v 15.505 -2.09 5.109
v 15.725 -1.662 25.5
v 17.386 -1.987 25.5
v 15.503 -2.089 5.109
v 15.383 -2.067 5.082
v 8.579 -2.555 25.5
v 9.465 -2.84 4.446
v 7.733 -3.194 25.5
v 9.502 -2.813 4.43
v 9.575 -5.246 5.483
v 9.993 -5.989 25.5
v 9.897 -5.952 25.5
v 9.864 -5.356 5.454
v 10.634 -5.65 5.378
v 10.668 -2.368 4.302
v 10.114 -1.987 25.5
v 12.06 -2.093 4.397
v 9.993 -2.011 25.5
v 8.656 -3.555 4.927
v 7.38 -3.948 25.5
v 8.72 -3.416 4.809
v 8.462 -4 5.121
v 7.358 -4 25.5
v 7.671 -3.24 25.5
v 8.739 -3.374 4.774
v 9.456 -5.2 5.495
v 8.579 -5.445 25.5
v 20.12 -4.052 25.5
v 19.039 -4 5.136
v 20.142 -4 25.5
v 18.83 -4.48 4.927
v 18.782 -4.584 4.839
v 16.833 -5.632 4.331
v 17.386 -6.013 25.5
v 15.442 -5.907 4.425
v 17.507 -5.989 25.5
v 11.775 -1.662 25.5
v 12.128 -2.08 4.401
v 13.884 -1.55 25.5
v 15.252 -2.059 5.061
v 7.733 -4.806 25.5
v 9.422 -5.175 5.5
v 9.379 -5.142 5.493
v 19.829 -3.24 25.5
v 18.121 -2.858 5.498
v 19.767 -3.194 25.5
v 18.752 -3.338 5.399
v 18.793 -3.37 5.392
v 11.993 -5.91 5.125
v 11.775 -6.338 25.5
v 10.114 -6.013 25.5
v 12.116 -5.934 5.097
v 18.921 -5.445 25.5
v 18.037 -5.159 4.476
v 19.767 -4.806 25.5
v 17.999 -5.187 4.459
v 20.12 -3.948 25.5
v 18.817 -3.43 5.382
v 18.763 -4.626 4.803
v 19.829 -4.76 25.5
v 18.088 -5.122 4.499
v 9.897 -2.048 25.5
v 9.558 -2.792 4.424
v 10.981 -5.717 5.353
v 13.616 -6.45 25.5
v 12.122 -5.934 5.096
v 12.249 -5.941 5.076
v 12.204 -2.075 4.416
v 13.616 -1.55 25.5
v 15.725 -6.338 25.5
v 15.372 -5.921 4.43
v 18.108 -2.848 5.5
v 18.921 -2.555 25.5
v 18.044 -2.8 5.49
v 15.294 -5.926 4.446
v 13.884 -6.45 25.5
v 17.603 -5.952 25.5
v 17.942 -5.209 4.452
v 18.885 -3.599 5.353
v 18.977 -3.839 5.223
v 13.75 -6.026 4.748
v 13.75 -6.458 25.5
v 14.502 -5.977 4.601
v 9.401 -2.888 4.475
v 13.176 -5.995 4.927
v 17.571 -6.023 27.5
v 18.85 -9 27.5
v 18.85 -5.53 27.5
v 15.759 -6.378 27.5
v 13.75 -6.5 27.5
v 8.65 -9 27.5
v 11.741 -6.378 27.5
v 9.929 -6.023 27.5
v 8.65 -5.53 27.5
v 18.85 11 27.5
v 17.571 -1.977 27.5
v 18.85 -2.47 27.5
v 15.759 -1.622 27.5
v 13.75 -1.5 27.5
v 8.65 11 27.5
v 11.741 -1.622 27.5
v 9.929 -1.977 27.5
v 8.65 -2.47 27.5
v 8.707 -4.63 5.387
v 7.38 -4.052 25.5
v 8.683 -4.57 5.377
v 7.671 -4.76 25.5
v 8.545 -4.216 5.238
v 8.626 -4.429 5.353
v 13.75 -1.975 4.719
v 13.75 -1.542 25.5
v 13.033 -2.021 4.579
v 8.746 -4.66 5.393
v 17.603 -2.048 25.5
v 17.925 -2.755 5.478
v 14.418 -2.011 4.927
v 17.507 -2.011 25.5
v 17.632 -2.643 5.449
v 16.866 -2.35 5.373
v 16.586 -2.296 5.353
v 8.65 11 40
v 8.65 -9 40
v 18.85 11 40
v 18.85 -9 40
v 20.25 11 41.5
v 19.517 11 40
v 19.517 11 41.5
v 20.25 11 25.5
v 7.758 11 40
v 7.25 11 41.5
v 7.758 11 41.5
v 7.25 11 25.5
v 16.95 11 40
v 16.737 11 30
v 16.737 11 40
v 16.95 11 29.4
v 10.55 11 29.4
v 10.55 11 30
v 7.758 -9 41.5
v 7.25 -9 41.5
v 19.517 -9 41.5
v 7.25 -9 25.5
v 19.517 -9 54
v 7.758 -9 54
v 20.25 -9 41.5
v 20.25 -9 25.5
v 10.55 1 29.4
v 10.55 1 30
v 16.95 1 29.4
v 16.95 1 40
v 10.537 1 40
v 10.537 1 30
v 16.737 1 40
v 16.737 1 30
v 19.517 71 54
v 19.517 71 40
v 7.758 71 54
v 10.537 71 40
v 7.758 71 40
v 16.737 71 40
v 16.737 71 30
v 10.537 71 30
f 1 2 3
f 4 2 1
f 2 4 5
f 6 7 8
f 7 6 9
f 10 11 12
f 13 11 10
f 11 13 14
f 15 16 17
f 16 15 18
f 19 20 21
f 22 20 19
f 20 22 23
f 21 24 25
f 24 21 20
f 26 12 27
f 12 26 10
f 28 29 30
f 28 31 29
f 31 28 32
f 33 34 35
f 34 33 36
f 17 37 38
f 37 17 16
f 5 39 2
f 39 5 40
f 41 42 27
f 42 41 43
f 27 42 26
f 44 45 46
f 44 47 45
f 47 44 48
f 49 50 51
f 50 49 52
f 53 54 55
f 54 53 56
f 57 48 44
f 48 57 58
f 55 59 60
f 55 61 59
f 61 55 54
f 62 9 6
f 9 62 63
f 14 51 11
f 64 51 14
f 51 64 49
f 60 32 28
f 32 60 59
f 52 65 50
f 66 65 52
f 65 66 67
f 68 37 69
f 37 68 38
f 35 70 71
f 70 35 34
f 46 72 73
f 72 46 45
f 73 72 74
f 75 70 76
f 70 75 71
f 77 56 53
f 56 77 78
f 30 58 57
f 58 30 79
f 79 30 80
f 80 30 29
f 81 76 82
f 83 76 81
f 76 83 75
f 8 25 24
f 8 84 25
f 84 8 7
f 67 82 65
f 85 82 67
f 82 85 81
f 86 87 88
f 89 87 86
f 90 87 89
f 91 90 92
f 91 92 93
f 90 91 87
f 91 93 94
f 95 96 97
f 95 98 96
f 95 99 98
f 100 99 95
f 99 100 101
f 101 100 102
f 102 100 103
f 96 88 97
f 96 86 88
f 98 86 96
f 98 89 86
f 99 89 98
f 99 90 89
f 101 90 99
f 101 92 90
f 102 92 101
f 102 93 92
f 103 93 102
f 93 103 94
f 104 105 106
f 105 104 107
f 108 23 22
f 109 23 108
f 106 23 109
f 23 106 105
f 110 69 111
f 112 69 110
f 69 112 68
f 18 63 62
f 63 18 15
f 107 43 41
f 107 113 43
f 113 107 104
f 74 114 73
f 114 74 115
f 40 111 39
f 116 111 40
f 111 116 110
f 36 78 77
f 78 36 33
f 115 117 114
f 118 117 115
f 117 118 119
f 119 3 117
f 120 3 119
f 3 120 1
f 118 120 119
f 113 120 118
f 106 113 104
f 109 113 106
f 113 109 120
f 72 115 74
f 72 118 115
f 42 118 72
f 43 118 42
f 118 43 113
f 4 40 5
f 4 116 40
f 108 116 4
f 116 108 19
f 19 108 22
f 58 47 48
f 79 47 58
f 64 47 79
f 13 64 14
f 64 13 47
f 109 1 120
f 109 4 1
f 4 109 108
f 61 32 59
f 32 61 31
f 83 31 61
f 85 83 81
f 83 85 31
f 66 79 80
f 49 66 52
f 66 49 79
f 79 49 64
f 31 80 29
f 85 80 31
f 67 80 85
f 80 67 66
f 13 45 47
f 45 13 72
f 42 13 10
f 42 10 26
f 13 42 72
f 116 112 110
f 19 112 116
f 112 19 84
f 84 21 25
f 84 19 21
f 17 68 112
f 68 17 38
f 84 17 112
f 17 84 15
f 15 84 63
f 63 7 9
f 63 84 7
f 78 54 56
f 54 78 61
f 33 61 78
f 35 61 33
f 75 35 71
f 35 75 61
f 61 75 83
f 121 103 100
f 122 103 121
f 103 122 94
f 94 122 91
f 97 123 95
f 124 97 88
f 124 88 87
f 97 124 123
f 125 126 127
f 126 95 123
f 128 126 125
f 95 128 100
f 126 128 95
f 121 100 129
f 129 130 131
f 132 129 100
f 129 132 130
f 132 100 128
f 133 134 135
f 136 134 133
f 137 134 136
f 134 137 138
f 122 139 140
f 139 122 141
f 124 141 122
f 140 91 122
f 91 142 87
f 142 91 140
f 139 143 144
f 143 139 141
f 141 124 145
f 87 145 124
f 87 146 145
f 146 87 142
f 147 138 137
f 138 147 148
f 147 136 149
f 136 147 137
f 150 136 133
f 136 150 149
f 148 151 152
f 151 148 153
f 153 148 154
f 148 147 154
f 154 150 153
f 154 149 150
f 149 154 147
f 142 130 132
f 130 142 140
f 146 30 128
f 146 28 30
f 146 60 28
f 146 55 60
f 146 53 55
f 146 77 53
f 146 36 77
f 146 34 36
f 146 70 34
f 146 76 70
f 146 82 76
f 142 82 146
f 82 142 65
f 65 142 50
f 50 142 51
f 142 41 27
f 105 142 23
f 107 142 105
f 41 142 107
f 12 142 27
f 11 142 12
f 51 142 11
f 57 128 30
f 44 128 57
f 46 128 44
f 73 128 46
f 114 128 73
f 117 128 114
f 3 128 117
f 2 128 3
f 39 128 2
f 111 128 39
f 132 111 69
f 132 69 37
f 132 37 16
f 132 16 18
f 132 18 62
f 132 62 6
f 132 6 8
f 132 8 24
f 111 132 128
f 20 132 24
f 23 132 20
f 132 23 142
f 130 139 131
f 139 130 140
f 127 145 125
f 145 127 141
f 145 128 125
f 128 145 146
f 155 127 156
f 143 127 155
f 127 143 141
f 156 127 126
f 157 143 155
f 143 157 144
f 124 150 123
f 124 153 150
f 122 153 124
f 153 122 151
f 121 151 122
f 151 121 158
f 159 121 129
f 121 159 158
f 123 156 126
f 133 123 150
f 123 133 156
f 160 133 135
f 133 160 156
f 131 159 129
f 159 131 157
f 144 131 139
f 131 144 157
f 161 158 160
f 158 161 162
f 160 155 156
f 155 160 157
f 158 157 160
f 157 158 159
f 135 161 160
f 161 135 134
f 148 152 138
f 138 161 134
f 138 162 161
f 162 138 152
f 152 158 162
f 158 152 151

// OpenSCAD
// file: irkem_hammerTips_v1.scad
tol = 0.2;
extrWall = 1.7+tol;
extrH = 12.9+tol;//12.6+tol;
extrW = 10+tol;

hammerY = 20;
hammerZ = 24;

$fn = 20;

module hammerTips(){
//Strike cylinder:
//v1: made elliptical and added skew-angle indentation to:
//      1. Avoid hitting adjacent strings
//      2. Maximize likelihood of striking proper string
//      3. Ensure that hammer tip force on the string is centering
//Prior cone geometry resulted in adjacent string strikes in y axis for most keys
    difference(){
        translate([0,-5,0]) scale([2.6,1,1]) cylinder(hammerZ,2.5,2);
        translate([-12,-1.8,25]) rotate([0,90,-15]) cylinder(hammerZ,3,3);
    }
difference(){
    translate([-6.5,-10,-14]) cube([13,hammerY,16]);
    union(){uChan();translate([-extrW/2,-hammerY/2,-extrH]) cube([extrW,hammerY/2,extrH]);
}
}
module uChan(){
difference(){
    translate([-extrW/2,-hammerY/2,-extrH]) cube([extrW,hammerY,extrH]);
    translate([-extrW/2+extrWall,-hammerY/2,-extrH-extrWall]) cube([extrW-2*extrWall,hammerY,extrH]);
}
}
}

//hammerTips();
// main file
include <irkem_hammerTips_v1.scad>

xO = -6;
yO = -11;
zO = 40;

kH = 4;
bH = 10;
wL = 50;
bL = 80;
oct = 6.5 * 25.4;
gap = 2;
n_oct = 1;//5;
n_keys = 12 * n_oct;
oset = -1;

sharpFlag = 1;
//k=0;
//for (k = [0:1:(n_keys-1)]){
    //
    translate([1*13.75+6.0+xO,12+yO,-12.5+zO]) rotate([0,180,0]) hammerTips();
//}//

//for (k = [0:1:(n_oct-1)]){//
k=0;
////C:
//color("ivory") translate([k*oct+0+xO,0+yO,0+zO]) cube([oct*1/12-gap,bL,kH]);
//color("ivory") translate([k*oct+0+xO,-wL+yO,0+zO]) cube([oct*1/7-gap,wL,kH]);//

//C#:
if (sharpFlag){    
color("black") translate([k*oct+oct*1/12+xO,gap+yO,0+zO]) cube([oct*1/12-gap,bL,kH+bH]);
}//

////D:
//color("ivory") translate([k*oct+oct*2/12+xO,0+yO,0+zO]) cube([oct*1/12-gap,bL,kH]);
//color("ivory") translate([k*oct+oct*1/7+xO,-wL+yO,0+zO]) cube([oct*1/7-gap,wL,kH]);//

////D#:
//if (sharpFlag){
//color("black") translate([k*oct+oct*3/12+xO,gap+yO,0+zO]) cube([oct*1/12-gap,bL,kH+bH]);
//}//

////E:
//color("ivory") translate([k*oct+oct*4/12+xO,0+yO,0+zO]) cube([2+oct*1/12-gap,bL,kH]);
//color("ivory") translate([k*oct+oct*2/7+xO,-wL+yO,0+zO]) cube([oct*1/7-gap,wL,kH]);//

////F:
//color("ivory") difference(){
//    translate([k*oct+oct*3/7+xO,-wL+yO,0+zO]) cube([oct*1/7-gap,wL+bL,kH]);
//    translate([k*oct+oct*6/12-2+xO,0+yO,0+zO]) cube([4+oct*(1/7-1/12)-gap,bL,kH]);
//}
//color("ivory") translate([k*oct+oct*3/7+xO,-wL+yO,0+zO]) cube([oct*1/7-gap,wL,kH]);//

////F#:
//if (sharpFlag){
//color("black") translate([k*oct+oct*6/12+xO,gap+yO,0+zO]) cube([oct*1/12-gap,bL,kH+bH]);
//}//

////G:
//color("ivory") translate([k*oct+oct*7/12+xO,0+yO,0+zO]) cube([oct*1/12-gap,bL,kH]);
//color("ivory") translate([k*oct+oct*4/7+xO,-wL+yO,0+zO]) cube([oct*1/7-gap,wL,kH]);//

////G#:
//if (sharpFlag){
//color("black") translate([k*oct+oct*8/12+xO,gap+yO,0+zO]) cube([oct*1/12-gap,bL,kH+bH]);
//}//

////A:
//color("ivory") translate([k*oct+oct*9/12+xO,0+yO,0+zO]) cube([oct*1/12-gap,bL,kH]);
//color("ivory") translate([k*oct+oct*5/7+xO,-wL+yO,0+zO]) cube([oct*1/7-gap,wL,kH]);//

////A#:
//if (sharpFlag){
//color("black") translate([k*oct+oct*10/12+xO,gap+yO,0+zO]) cube([oct*1/12-gap,bL,kH+bH]);
//}//

////B:
//color("ivory") translate([k*oct+oct*11/12+xO,0+yO,0+zO]) cube([oct*1/12-gap,bL,kH]);
//color("ivory") translate([k*oct+oct*6/7+xO,-wL+yO,0+zO]) cube([oct*1/7-gap,wL,kH]);//

//}//

//for (i = [0,2,4,5,7,9,11]){//[0:1:(n_keys-1)]){
//    translate([oset+oct*i/12+(oct*1/12-6.2)/2+xO,2+10+yO,-10+zO]) cube([6.2,bL-10,10]);
//}//

if (sharpFlag){
    for (i = 1){//[1,3,6,8,10]){//[0:1:(n_keys-1)]){
    translate([oset+oct*i/12+(oct*1/12-6.2)/2+xO,2+10+yO,-10+zO]) cube([6.2,bL-10,10]);
}
}
